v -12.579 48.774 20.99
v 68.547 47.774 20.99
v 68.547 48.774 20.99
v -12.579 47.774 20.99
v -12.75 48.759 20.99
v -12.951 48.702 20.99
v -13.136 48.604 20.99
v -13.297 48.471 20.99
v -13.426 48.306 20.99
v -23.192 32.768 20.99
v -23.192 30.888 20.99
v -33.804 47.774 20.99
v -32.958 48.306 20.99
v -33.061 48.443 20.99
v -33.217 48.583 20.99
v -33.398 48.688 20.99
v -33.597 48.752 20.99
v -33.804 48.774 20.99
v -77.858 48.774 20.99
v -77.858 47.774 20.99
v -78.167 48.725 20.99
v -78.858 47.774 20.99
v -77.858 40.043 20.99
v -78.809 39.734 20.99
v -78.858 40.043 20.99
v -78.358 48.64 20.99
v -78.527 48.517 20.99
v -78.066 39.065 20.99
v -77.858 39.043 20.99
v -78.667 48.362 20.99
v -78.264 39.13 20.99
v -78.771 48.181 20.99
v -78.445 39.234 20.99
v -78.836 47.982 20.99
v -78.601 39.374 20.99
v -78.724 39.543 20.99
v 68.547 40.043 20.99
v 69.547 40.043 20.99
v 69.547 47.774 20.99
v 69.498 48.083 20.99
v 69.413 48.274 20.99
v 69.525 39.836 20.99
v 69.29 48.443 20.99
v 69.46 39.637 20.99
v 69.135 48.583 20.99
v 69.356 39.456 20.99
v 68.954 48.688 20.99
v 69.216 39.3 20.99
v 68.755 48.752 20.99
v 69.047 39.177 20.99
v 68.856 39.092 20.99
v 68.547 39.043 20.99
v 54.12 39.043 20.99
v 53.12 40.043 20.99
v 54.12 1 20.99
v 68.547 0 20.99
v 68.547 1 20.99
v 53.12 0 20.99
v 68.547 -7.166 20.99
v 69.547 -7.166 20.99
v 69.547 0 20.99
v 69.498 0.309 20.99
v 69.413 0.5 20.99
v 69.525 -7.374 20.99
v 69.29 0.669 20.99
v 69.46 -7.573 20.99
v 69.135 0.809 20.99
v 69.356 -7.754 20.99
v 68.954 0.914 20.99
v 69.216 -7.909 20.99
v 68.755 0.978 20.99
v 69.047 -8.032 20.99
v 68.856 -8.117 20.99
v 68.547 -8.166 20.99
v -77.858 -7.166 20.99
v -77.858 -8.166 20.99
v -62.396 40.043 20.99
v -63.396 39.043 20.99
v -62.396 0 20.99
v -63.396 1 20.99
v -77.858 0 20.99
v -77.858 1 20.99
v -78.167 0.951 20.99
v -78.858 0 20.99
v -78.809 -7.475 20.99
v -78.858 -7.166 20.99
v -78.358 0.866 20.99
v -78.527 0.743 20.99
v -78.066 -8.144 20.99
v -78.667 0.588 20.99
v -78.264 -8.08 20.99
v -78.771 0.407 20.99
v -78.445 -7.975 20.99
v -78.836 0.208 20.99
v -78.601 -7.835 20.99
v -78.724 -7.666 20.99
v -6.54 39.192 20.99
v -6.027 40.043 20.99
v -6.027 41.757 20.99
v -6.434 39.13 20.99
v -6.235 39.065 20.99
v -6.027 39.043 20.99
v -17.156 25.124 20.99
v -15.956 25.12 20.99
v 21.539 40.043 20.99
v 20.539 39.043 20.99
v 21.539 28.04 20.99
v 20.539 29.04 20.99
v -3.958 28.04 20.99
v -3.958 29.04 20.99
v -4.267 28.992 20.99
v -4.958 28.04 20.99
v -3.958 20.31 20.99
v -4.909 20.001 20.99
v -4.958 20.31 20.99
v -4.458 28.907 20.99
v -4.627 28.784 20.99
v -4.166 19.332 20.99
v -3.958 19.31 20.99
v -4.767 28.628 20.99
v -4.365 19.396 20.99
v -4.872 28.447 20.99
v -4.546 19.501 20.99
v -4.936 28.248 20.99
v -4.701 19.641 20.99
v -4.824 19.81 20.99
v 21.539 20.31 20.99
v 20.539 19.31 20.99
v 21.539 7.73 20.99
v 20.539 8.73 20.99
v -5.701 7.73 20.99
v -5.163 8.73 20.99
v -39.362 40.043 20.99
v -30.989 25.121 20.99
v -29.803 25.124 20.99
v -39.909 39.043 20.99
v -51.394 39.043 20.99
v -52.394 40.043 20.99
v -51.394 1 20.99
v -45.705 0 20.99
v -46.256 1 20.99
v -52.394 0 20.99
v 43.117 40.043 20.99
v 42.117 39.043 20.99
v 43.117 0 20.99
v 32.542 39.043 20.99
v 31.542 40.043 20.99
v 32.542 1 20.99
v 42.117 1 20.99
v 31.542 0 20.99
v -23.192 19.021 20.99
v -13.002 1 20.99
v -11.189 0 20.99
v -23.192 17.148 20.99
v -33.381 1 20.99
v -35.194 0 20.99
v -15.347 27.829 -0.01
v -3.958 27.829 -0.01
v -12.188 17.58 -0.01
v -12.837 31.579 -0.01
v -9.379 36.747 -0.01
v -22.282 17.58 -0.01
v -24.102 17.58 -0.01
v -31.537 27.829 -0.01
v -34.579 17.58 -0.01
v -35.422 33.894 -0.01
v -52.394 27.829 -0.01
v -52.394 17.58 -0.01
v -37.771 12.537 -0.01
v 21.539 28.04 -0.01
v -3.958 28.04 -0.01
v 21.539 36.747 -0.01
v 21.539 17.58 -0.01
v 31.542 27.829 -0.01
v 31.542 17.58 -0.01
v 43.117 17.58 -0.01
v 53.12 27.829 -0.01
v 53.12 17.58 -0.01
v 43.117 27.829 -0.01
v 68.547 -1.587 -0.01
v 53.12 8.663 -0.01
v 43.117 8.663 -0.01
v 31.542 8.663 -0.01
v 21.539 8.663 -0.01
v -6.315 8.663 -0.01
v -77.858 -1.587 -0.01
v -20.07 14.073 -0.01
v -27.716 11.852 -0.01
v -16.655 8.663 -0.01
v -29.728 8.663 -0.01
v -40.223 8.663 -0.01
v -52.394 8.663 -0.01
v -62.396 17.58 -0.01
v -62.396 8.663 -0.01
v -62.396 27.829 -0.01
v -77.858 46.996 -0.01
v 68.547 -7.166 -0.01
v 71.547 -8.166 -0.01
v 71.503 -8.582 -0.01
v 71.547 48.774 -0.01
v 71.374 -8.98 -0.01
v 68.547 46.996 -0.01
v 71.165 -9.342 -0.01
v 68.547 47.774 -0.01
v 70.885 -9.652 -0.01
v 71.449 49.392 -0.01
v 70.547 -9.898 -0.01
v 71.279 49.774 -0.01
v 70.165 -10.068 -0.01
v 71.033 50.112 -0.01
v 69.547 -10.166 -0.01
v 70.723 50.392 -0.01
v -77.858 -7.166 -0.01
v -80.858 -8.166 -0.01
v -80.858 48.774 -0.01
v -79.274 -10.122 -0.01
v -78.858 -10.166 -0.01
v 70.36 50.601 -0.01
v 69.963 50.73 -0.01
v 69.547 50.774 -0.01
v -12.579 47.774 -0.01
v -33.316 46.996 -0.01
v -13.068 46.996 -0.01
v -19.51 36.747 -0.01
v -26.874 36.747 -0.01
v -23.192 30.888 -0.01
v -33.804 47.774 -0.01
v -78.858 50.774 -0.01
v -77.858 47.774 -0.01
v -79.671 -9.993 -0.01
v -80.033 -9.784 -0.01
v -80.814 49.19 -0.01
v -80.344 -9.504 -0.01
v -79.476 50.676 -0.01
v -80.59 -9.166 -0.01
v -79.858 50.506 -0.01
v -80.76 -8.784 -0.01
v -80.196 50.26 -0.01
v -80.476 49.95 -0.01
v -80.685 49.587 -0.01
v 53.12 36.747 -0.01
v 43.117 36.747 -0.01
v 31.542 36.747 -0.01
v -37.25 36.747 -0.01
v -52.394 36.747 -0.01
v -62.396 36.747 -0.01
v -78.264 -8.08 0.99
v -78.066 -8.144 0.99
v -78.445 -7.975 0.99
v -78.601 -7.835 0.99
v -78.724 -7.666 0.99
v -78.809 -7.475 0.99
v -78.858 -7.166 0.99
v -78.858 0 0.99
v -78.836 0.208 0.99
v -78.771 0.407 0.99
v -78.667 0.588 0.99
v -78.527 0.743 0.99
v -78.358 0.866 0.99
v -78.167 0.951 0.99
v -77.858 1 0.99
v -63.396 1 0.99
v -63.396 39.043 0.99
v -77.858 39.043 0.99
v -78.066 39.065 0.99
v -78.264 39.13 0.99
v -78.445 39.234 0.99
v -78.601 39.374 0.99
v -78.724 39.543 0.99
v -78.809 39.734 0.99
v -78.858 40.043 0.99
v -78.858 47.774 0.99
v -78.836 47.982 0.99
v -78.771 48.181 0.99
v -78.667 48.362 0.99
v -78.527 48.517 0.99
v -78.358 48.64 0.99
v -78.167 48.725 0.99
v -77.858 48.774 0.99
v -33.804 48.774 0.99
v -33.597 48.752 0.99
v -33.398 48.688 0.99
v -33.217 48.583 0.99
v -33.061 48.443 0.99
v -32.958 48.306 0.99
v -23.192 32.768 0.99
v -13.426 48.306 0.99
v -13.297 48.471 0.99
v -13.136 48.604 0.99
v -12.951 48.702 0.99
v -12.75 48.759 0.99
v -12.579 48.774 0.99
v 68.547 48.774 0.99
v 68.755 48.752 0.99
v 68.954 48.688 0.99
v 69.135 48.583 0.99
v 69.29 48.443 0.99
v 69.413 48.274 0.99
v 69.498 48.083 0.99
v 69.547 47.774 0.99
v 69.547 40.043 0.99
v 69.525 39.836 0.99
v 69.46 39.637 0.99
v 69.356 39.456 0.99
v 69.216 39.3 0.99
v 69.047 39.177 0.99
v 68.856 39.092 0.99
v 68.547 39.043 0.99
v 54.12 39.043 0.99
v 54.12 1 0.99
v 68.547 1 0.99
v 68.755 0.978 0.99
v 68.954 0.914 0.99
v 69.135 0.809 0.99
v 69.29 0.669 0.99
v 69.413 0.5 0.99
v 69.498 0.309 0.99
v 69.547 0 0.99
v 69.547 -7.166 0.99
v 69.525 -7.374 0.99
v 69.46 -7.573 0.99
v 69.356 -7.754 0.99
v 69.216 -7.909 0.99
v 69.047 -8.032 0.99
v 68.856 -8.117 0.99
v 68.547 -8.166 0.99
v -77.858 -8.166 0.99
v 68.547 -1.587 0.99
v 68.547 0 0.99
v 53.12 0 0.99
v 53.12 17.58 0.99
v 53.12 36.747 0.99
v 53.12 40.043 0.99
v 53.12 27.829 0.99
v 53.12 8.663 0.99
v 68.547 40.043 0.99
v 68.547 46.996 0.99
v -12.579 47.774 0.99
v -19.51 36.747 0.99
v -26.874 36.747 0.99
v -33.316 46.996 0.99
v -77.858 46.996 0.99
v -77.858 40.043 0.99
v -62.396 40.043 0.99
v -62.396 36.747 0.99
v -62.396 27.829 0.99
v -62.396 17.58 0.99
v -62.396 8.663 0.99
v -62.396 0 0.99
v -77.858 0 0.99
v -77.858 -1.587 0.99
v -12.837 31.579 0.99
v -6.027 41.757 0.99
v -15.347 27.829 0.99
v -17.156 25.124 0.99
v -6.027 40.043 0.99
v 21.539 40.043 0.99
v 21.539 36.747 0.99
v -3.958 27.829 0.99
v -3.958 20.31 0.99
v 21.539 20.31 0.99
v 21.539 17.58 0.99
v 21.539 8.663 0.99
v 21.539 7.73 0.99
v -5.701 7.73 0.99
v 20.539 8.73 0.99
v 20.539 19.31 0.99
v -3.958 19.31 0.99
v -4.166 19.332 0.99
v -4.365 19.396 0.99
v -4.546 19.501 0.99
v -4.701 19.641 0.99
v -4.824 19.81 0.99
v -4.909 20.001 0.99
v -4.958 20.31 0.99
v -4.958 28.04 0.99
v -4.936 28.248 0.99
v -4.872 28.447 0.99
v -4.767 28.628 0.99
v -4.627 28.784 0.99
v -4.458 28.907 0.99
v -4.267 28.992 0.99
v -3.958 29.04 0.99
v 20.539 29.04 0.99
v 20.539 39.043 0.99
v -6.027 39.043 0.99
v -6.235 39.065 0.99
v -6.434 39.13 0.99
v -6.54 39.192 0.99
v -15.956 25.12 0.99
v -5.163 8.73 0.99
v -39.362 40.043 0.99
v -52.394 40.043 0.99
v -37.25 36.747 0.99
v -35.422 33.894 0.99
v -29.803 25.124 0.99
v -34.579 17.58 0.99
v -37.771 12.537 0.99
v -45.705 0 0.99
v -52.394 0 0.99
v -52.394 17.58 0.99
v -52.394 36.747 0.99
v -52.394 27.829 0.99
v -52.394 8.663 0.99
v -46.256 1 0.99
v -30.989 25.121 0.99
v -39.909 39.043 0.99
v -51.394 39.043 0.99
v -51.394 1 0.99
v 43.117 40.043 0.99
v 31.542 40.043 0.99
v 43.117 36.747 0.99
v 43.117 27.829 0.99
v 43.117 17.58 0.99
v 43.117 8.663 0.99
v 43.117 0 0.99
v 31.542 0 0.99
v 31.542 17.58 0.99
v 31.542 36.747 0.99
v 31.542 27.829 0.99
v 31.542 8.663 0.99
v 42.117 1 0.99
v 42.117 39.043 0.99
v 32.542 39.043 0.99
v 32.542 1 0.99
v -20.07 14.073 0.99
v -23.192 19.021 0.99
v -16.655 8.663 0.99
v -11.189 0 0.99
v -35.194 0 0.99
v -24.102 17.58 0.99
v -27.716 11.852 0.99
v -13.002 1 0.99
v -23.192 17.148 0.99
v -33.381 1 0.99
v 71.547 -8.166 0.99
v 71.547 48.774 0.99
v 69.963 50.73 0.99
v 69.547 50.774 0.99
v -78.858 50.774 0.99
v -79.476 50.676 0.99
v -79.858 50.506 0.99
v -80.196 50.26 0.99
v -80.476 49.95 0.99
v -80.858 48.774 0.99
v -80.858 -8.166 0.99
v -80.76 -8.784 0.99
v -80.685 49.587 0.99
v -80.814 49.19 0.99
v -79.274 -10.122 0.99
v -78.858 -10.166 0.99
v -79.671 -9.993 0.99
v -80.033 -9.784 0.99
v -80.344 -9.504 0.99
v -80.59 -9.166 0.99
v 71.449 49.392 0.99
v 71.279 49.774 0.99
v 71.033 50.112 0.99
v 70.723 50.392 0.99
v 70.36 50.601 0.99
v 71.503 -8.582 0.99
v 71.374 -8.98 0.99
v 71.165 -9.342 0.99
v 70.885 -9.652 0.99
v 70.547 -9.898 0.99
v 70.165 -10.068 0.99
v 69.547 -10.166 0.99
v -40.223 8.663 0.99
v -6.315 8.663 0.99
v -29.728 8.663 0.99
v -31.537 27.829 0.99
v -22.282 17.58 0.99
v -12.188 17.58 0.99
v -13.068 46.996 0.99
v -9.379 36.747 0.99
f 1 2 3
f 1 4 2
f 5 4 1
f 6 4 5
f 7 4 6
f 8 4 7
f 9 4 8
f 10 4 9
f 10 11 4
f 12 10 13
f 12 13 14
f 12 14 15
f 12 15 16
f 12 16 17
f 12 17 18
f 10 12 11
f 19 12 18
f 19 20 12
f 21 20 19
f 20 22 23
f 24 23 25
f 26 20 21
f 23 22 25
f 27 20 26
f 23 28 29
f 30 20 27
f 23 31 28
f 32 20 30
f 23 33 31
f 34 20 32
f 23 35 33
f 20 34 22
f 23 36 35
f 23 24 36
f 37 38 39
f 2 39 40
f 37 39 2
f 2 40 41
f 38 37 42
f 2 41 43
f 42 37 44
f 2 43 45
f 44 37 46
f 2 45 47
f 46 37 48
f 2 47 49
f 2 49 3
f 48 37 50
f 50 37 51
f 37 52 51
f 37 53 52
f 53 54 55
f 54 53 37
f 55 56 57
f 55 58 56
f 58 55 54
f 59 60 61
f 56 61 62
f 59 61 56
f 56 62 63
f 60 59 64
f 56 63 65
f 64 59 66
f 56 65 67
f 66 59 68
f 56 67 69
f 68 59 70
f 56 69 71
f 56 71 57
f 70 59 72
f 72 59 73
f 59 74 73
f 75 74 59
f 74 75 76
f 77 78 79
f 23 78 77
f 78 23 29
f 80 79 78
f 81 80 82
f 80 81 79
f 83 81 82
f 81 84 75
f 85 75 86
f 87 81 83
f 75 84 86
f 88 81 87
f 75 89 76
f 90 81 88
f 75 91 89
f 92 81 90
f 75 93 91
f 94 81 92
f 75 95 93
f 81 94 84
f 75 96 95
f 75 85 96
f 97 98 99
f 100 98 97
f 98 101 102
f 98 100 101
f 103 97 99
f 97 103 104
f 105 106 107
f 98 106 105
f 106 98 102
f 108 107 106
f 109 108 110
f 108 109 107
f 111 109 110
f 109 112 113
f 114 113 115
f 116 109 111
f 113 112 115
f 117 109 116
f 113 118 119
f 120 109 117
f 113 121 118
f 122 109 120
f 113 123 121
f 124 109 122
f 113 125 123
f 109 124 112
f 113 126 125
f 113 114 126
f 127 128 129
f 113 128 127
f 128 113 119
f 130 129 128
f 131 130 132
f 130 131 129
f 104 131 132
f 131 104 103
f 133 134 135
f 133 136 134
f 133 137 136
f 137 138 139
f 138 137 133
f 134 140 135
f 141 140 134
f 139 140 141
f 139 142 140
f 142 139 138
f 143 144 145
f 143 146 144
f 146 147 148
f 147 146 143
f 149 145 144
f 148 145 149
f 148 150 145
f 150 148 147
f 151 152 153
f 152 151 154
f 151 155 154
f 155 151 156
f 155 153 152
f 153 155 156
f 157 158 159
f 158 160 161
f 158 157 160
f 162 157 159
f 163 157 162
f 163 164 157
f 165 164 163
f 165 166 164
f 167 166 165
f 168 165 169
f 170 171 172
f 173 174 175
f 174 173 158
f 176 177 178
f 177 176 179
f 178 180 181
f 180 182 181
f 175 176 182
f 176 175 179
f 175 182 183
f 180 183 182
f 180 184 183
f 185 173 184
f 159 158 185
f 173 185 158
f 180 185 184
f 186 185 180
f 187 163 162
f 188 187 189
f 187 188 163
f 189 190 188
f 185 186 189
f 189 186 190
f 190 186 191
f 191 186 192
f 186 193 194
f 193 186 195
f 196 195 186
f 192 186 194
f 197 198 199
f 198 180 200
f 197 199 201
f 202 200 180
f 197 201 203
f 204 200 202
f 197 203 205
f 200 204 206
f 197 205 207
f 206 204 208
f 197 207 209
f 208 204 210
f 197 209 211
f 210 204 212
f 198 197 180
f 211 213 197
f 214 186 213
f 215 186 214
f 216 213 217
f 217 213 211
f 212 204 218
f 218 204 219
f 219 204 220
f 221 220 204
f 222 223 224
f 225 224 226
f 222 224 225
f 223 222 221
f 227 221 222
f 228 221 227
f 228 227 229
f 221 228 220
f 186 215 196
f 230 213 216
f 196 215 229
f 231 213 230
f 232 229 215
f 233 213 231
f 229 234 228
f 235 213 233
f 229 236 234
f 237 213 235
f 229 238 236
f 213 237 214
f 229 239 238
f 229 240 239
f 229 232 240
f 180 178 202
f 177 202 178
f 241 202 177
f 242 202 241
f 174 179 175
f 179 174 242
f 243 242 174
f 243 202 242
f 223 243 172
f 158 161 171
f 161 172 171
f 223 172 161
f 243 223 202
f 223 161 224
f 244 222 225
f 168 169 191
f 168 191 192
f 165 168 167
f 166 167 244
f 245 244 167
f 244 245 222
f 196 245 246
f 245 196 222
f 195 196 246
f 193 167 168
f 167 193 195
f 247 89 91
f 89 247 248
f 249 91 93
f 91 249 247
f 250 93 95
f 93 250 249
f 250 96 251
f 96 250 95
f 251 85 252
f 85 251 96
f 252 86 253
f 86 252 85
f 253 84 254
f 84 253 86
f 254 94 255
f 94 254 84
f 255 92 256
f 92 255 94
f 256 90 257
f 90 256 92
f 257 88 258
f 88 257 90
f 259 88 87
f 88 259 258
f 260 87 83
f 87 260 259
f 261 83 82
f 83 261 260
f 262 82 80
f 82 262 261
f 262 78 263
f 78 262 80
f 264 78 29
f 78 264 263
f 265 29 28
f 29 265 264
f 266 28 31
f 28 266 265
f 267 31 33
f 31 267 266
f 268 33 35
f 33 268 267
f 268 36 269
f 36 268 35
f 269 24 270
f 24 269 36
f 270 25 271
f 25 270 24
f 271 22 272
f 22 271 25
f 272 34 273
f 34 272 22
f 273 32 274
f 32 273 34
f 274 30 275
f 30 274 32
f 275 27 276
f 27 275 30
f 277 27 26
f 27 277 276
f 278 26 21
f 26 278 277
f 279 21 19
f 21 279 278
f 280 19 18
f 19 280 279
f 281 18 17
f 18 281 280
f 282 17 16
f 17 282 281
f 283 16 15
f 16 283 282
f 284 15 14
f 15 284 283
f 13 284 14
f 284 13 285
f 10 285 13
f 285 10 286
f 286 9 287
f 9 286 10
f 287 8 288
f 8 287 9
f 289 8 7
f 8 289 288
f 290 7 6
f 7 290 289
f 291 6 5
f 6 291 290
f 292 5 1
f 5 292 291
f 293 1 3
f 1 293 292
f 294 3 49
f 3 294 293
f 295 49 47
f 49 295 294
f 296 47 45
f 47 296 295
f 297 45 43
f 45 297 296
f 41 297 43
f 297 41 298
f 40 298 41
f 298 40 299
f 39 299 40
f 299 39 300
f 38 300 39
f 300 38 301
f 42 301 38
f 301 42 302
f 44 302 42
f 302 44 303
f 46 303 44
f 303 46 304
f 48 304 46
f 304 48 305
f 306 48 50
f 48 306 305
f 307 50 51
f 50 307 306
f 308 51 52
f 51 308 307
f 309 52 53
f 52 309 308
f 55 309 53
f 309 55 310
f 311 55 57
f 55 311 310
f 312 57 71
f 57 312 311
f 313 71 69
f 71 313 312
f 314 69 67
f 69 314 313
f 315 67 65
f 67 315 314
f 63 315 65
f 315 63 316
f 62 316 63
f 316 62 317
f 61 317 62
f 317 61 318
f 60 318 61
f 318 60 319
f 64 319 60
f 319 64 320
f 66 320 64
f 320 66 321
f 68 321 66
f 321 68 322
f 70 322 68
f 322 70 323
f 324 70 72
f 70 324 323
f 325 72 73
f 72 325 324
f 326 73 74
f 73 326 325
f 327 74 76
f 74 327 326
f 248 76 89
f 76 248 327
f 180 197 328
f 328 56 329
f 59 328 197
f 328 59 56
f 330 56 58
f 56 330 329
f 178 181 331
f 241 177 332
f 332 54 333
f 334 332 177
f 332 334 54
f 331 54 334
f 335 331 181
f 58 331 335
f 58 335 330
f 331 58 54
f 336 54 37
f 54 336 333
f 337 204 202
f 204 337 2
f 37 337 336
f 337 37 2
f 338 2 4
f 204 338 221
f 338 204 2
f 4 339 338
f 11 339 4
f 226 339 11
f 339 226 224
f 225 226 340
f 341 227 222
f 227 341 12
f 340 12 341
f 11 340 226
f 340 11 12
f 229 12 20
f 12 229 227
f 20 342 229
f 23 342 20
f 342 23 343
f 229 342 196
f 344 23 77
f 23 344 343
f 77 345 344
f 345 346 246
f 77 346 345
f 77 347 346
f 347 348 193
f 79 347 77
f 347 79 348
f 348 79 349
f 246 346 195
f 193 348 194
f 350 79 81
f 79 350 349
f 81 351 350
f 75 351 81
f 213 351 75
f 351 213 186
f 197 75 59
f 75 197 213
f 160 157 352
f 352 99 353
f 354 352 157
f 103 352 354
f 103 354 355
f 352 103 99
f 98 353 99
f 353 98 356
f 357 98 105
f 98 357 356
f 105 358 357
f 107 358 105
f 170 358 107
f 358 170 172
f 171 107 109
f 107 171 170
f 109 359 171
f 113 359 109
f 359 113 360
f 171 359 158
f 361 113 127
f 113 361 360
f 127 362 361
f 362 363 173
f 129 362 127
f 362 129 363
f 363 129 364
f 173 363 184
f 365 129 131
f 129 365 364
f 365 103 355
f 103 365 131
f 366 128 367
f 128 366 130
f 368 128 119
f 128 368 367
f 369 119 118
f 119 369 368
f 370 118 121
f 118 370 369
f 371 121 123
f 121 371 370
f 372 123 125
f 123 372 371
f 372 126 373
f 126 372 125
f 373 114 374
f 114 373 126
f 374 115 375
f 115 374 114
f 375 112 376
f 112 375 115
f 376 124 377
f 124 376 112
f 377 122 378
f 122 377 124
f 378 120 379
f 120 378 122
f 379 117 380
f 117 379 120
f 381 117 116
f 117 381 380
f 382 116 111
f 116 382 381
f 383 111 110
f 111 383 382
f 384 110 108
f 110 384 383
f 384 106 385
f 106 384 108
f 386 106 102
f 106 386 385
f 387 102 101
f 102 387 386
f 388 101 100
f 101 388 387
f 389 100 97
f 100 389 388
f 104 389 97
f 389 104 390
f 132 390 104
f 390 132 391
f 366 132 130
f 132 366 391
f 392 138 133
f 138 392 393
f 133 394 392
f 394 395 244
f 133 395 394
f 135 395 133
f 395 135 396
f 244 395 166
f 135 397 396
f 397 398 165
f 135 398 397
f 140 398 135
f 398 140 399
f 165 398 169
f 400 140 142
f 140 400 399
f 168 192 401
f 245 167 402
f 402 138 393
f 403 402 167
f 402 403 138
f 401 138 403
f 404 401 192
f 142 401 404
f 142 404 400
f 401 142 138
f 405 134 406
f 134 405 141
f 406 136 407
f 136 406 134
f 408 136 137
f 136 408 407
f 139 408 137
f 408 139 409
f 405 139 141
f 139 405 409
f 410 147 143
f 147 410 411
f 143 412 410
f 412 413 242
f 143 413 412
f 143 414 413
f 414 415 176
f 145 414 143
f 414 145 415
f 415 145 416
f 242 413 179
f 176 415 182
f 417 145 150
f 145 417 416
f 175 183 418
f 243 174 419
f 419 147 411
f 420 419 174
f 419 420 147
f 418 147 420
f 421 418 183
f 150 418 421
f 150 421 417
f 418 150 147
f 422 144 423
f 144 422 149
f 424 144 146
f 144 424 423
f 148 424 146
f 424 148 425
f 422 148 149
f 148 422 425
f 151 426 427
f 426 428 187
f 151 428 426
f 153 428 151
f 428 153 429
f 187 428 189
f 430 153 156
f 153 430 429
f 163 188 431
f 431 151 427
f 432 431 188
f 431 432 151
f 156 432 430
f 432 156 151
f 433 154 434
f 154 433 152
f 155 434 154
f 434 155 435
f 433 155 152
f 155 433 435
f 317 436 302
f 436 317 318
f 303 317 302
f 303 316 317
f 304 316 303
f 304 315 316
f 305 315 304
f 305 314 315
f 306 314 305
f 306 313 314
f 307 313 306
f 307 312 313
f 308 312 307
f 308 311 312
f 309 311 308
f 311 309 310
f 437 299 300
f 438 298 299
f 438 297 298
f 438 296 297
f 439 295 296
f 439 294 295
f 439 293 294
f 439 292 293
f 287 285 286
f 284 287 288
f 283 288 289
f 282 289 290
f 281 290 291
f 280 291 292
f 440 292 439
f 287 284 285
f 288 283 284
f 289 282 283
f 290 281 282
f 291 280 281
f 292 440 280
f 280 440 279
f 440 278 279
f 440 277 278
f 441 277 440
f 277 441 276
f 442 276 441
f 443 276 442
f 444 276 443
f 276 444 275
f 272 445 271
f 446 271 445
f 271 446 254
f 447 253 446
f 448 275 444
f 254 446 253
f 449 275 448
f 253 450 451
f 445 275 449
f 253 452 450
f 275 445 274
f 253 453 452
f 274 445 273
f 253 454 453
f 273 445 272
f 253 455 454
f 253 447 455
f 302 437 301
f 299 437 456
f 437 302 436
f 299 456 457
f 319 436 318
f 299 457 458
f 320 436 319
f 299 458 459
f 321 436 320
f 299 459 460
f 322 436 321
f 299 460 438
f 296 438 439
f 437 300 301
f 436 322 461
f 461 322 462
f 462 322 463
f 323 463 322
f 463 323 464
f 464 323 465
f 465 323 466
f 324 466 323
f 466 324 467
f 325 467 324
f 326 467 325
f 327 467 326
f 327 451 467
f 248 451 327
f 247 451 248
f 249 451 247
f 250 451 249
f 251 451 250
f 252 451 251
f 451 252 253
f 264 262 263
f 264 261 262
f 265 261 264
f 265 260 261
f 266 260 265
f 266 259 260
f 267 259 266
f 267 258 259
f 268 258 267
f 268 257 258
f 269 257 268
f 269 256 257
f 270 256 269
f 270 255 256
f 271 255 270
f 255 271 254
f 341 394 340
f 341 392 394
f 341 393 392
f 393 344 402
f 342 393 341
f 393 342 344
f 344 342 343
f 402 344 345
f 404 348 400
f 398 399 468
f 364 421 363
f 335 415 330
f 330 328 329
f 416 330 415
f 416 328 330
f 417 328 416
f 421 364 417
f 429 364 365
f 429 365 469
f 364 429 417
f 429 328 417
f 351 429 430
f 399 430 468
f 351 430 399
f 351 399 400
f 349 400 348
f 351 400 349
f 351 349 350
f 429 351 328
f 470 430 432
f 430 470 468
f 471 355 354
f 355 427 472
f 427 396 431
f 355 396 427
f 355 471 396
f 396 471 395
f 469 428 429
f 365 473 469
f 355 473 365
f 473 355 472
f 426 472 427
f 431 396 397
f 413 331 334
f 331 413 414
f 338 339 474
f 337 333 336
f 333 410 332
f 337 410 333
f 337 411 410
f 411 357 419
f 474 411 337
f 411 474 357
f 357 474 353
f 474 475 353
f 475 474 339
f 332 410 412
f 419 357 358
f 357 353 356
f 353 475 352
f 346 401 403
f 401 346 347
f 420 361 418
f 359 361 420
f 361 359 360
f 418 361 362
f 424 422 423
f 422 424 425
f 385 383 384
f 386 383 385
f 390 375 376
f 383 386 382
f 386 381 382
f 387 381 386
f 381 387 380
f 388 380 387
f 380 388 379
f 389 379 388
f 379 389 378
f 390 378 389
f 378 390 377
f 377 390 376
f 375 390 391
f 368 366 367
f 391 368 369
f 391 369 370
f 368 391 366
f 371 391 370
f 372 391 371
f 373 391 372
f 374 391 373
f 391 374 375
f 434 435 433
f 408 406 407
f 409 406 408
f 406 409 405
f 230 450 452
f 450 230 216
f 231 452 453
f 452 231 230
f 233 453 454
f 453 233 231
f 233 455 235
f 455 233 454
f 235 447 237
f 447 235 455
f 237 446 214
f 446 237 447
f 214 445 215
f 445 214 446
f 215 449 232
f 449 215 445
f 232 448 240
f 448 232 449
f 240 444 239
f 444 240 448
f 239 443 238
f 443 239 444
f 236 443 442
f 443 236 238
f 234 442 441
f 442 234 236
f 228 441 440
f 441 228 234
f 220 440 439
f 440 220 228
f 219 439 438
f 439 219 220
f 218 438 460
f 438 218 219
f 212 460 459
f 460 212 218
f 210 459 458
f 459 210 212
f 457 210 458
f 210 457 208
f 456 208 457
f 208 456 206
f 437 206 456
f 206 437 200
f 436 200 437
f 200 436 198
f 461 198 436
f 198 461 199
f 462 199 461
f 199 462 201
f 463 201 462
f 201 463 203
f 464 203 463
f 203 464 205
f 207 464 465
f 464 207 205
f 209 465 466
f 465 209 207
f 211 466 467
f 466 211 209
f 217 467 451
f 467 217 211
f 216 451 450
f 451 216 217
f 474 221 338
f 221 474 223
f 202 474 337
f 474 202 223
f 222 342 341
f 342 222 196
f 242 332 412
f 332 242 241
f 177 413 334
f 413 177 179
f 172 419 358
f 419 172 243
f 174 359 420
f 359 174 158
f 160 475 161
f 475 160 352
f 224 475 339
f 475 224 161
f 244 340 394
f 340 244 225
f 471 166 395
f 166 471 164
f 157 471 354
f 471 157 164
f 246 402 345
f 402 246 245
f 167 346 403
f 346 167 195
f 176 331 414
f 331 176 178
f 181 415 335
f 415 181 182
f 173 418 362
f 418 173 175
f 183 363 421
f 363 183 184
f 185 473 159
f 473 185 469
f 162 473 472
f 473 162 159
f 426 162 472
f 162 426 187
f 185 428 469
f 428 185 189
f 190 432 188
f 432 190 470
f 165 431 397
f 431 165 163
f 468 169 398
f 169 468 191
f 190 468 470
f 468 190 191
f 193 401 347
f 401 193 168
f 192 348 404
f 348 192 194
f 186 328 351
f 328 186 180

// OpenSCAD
// (recommended ALL UPPERCASE/CAPITAL LETTERS)
text = "TEXT";

text_size = 50; // [5:1:300]

// (less than 100% helps letters stay connected)
letter_spacing_percentage = 80; // [10:1:200]

// (also helps to keep letters joined)
include_underline = 1; // [0:No, 1:Yes]

underline_height_percentage = 15; // [1:1:50]

// (millimeters)
wall_height = 20; // [1:0.1:40]

// (millimeters)
wall_thickness = 1; // [0:0.1:10]

// (millimeters)
top_support_overhang = 2; // [0:0.1:10]

// (millimeters)
top_support_thickness = 1; // [0:0.1:10]

number_of_support_lines = 3; // [0:1:10]

support_line_height_percentage = 18; // [0:1:50]

support_line_offset_percentage = 12; // [-100:1:100]

// Render a preview of the cookie (turn this OFF before saving/printing)
cookie_preview = 0; // [0:Off, 1:On]


// str2vec from Nathanael Jourdane (nathanael@jourdane.net)
// http://www.thingiverse.com/thing:1237203
function str2vec(str, v=[], i=0) =
	i == len(str) ? v :
	str2vec(str, concat(v, str[i]), i+1);

module Text2D(text, size, underline=0, underline_height=0.16, spacing=0.8, radius=0) {
    offset(r=radius) {
        text(str(text),
            size=size,
            font="Helvetica:style=Bold",
            halign="center",
            spacing=spacing);
        if (underline == 1) {
            descenders = len([ for (a = search(str2vec("qpjg"), str2vec(str(text)))) if (a > 0) a ]) > 0;
            descender_correction = descenders ? 0.3 * size * underline_height : 0;
            translate([0, -1 * descender_correction, 0]) projection(cut = false) scale([1, -1 * underline_height, 1]) hull() BoundingBox() linear_extrude(height=1, convexity=4) {
                text(str(text),
                    size=size,
                    font="Helvetica:style=Bold",
                    halign="center",
                    spacing=spacing);
            }
        }
    }
}

module OutlineText(text, size, underline=0, underline_height=0.16, spacing=0.8, height=3, thickness=1) {
    linear_extrude(height=height, convexity=4) {
        difference() {
            Text2D(text, size, underline, underline_height, spacing, thickness);
            translate([0, 0, 0.1]) scale([1, 1, 1.5]) Text2D(text, size, underline, underline_height, spacing, 0);
        }
    }
}

module OutlineTextSupports(text, size, underline=0, spacing=0.8, thickness=1, height=3, overhang=10, number_of_support_lines=3, support_line_height=0.15, support_line_offset=0, underline_height=0.16) {
    linear_extrude(height=height, convexity=4) union() {
        difference() {
            offset(overhang) projection(cut = false) hull() BoundingBox() linear_extrude(height=1, convexity=4) Text2D(text, size, underline, underline_height, spacing, thickness);
            Text2D(text, size, underline, underline_height, spacing, 0);
        }
        
        descenders = len([ for (a = search(str2vec("qpjg"), str2vec(str(text)))) if (a > 0) a ]) > 0;
        descender_correction = descenders ? 0.3 * size * underline_height : 0;
        underline_size = (underline == 1) ? size * underline_height + descender_correction : 0;
        v_size = size + underline_size;
        v_space = v_size / number_of_support_lines;
        
        for (s = [0 : 1 : number_of_support_lines - 1]) {
            translate([0, s * v_space - underline_size + (v_space / 2) - (support_line_height * size / 2) + (support_line_offset * v_space), 0]) projection(cut = false) scale([1, support_line_height, 1]) hull() BoundingBox() linear_extrude(height=1, convexity=4) Text2D(text, size, underline, underline_height, spacing, thickness);
        }
    }
}

module BoundingBox() {
    intersection() {
        translate([0,0,0])
        linear_extrude(height = 1000, center = true, convexity = 10, twist = 0) 
        projection(cut=false) intersection() {
            rotate([0,90,0]) 
            linear_extrude(height = 1000, center = true, convexity = 10, twist = 0) 
            projection(cut=false) 
            rotate([0,-90,0]) 
            children(0);
            rotate([90,0,0]) 
            linear_extrude(height = 1000, center = true, convexity = 10, twist = 0) 
            projection(cut=false) 
            rotate([-90,0,0]) 
            children(0);
        }
        rotate([90,0,0]) 
        linear_extrude(height = 1000, center = true, convexity = 10, twist = 0) 
        projection(cut=false) 
        rotate([-90,0,0])
        intersection() {
            rotate([0,90,0]) 
            linear_extrude(height = 1000, center = true, convexity = 10, twist = 0) 
            projection(cut=false) 
            rotate([0,-90,0]) 
            children(0);
            rotate([0,0,0]) 
            linear_extrude(height = 1000, center = true, convexity = 10, twist = 0) 
            projection(cut=false) 
            rotate([0,0,0]) 
            children(0);
        }
    }
}


// Lower the minimum fragment size for smoother edges
$fs = 0.1;

if (cookie_preview == 1) {
    linear_extrude(height=4, convexity=4) {
        Text2D(text, text_size, include_underline, underline_height_percentage / 100.0, letter_spacing_percentage / 100.0, 0);
    }
} else {
    translate([0, 0, wall_height + top_support_thickness - 0.01]) scale([-1, 1, -1]) union() {
        OutlineText(text, text_size, include_underline, underline_height_percentage / 100.0, letter_spacing_percentage / 100.0, wall_height + top_support_thickness, wall_thickness);
        translate([0, 0, wall_height]) OutlineTextSupports(text, text_size, include_underline, letter_spacing_percentage / 100.0, wall_thickness, top_support_thickness, top_support_overhang, number_of_support_lines, support_line_height_percentage / 100.0, support_line_offset_percentage / 100.0, underline_height_percentage / 100.0);
    }
}
